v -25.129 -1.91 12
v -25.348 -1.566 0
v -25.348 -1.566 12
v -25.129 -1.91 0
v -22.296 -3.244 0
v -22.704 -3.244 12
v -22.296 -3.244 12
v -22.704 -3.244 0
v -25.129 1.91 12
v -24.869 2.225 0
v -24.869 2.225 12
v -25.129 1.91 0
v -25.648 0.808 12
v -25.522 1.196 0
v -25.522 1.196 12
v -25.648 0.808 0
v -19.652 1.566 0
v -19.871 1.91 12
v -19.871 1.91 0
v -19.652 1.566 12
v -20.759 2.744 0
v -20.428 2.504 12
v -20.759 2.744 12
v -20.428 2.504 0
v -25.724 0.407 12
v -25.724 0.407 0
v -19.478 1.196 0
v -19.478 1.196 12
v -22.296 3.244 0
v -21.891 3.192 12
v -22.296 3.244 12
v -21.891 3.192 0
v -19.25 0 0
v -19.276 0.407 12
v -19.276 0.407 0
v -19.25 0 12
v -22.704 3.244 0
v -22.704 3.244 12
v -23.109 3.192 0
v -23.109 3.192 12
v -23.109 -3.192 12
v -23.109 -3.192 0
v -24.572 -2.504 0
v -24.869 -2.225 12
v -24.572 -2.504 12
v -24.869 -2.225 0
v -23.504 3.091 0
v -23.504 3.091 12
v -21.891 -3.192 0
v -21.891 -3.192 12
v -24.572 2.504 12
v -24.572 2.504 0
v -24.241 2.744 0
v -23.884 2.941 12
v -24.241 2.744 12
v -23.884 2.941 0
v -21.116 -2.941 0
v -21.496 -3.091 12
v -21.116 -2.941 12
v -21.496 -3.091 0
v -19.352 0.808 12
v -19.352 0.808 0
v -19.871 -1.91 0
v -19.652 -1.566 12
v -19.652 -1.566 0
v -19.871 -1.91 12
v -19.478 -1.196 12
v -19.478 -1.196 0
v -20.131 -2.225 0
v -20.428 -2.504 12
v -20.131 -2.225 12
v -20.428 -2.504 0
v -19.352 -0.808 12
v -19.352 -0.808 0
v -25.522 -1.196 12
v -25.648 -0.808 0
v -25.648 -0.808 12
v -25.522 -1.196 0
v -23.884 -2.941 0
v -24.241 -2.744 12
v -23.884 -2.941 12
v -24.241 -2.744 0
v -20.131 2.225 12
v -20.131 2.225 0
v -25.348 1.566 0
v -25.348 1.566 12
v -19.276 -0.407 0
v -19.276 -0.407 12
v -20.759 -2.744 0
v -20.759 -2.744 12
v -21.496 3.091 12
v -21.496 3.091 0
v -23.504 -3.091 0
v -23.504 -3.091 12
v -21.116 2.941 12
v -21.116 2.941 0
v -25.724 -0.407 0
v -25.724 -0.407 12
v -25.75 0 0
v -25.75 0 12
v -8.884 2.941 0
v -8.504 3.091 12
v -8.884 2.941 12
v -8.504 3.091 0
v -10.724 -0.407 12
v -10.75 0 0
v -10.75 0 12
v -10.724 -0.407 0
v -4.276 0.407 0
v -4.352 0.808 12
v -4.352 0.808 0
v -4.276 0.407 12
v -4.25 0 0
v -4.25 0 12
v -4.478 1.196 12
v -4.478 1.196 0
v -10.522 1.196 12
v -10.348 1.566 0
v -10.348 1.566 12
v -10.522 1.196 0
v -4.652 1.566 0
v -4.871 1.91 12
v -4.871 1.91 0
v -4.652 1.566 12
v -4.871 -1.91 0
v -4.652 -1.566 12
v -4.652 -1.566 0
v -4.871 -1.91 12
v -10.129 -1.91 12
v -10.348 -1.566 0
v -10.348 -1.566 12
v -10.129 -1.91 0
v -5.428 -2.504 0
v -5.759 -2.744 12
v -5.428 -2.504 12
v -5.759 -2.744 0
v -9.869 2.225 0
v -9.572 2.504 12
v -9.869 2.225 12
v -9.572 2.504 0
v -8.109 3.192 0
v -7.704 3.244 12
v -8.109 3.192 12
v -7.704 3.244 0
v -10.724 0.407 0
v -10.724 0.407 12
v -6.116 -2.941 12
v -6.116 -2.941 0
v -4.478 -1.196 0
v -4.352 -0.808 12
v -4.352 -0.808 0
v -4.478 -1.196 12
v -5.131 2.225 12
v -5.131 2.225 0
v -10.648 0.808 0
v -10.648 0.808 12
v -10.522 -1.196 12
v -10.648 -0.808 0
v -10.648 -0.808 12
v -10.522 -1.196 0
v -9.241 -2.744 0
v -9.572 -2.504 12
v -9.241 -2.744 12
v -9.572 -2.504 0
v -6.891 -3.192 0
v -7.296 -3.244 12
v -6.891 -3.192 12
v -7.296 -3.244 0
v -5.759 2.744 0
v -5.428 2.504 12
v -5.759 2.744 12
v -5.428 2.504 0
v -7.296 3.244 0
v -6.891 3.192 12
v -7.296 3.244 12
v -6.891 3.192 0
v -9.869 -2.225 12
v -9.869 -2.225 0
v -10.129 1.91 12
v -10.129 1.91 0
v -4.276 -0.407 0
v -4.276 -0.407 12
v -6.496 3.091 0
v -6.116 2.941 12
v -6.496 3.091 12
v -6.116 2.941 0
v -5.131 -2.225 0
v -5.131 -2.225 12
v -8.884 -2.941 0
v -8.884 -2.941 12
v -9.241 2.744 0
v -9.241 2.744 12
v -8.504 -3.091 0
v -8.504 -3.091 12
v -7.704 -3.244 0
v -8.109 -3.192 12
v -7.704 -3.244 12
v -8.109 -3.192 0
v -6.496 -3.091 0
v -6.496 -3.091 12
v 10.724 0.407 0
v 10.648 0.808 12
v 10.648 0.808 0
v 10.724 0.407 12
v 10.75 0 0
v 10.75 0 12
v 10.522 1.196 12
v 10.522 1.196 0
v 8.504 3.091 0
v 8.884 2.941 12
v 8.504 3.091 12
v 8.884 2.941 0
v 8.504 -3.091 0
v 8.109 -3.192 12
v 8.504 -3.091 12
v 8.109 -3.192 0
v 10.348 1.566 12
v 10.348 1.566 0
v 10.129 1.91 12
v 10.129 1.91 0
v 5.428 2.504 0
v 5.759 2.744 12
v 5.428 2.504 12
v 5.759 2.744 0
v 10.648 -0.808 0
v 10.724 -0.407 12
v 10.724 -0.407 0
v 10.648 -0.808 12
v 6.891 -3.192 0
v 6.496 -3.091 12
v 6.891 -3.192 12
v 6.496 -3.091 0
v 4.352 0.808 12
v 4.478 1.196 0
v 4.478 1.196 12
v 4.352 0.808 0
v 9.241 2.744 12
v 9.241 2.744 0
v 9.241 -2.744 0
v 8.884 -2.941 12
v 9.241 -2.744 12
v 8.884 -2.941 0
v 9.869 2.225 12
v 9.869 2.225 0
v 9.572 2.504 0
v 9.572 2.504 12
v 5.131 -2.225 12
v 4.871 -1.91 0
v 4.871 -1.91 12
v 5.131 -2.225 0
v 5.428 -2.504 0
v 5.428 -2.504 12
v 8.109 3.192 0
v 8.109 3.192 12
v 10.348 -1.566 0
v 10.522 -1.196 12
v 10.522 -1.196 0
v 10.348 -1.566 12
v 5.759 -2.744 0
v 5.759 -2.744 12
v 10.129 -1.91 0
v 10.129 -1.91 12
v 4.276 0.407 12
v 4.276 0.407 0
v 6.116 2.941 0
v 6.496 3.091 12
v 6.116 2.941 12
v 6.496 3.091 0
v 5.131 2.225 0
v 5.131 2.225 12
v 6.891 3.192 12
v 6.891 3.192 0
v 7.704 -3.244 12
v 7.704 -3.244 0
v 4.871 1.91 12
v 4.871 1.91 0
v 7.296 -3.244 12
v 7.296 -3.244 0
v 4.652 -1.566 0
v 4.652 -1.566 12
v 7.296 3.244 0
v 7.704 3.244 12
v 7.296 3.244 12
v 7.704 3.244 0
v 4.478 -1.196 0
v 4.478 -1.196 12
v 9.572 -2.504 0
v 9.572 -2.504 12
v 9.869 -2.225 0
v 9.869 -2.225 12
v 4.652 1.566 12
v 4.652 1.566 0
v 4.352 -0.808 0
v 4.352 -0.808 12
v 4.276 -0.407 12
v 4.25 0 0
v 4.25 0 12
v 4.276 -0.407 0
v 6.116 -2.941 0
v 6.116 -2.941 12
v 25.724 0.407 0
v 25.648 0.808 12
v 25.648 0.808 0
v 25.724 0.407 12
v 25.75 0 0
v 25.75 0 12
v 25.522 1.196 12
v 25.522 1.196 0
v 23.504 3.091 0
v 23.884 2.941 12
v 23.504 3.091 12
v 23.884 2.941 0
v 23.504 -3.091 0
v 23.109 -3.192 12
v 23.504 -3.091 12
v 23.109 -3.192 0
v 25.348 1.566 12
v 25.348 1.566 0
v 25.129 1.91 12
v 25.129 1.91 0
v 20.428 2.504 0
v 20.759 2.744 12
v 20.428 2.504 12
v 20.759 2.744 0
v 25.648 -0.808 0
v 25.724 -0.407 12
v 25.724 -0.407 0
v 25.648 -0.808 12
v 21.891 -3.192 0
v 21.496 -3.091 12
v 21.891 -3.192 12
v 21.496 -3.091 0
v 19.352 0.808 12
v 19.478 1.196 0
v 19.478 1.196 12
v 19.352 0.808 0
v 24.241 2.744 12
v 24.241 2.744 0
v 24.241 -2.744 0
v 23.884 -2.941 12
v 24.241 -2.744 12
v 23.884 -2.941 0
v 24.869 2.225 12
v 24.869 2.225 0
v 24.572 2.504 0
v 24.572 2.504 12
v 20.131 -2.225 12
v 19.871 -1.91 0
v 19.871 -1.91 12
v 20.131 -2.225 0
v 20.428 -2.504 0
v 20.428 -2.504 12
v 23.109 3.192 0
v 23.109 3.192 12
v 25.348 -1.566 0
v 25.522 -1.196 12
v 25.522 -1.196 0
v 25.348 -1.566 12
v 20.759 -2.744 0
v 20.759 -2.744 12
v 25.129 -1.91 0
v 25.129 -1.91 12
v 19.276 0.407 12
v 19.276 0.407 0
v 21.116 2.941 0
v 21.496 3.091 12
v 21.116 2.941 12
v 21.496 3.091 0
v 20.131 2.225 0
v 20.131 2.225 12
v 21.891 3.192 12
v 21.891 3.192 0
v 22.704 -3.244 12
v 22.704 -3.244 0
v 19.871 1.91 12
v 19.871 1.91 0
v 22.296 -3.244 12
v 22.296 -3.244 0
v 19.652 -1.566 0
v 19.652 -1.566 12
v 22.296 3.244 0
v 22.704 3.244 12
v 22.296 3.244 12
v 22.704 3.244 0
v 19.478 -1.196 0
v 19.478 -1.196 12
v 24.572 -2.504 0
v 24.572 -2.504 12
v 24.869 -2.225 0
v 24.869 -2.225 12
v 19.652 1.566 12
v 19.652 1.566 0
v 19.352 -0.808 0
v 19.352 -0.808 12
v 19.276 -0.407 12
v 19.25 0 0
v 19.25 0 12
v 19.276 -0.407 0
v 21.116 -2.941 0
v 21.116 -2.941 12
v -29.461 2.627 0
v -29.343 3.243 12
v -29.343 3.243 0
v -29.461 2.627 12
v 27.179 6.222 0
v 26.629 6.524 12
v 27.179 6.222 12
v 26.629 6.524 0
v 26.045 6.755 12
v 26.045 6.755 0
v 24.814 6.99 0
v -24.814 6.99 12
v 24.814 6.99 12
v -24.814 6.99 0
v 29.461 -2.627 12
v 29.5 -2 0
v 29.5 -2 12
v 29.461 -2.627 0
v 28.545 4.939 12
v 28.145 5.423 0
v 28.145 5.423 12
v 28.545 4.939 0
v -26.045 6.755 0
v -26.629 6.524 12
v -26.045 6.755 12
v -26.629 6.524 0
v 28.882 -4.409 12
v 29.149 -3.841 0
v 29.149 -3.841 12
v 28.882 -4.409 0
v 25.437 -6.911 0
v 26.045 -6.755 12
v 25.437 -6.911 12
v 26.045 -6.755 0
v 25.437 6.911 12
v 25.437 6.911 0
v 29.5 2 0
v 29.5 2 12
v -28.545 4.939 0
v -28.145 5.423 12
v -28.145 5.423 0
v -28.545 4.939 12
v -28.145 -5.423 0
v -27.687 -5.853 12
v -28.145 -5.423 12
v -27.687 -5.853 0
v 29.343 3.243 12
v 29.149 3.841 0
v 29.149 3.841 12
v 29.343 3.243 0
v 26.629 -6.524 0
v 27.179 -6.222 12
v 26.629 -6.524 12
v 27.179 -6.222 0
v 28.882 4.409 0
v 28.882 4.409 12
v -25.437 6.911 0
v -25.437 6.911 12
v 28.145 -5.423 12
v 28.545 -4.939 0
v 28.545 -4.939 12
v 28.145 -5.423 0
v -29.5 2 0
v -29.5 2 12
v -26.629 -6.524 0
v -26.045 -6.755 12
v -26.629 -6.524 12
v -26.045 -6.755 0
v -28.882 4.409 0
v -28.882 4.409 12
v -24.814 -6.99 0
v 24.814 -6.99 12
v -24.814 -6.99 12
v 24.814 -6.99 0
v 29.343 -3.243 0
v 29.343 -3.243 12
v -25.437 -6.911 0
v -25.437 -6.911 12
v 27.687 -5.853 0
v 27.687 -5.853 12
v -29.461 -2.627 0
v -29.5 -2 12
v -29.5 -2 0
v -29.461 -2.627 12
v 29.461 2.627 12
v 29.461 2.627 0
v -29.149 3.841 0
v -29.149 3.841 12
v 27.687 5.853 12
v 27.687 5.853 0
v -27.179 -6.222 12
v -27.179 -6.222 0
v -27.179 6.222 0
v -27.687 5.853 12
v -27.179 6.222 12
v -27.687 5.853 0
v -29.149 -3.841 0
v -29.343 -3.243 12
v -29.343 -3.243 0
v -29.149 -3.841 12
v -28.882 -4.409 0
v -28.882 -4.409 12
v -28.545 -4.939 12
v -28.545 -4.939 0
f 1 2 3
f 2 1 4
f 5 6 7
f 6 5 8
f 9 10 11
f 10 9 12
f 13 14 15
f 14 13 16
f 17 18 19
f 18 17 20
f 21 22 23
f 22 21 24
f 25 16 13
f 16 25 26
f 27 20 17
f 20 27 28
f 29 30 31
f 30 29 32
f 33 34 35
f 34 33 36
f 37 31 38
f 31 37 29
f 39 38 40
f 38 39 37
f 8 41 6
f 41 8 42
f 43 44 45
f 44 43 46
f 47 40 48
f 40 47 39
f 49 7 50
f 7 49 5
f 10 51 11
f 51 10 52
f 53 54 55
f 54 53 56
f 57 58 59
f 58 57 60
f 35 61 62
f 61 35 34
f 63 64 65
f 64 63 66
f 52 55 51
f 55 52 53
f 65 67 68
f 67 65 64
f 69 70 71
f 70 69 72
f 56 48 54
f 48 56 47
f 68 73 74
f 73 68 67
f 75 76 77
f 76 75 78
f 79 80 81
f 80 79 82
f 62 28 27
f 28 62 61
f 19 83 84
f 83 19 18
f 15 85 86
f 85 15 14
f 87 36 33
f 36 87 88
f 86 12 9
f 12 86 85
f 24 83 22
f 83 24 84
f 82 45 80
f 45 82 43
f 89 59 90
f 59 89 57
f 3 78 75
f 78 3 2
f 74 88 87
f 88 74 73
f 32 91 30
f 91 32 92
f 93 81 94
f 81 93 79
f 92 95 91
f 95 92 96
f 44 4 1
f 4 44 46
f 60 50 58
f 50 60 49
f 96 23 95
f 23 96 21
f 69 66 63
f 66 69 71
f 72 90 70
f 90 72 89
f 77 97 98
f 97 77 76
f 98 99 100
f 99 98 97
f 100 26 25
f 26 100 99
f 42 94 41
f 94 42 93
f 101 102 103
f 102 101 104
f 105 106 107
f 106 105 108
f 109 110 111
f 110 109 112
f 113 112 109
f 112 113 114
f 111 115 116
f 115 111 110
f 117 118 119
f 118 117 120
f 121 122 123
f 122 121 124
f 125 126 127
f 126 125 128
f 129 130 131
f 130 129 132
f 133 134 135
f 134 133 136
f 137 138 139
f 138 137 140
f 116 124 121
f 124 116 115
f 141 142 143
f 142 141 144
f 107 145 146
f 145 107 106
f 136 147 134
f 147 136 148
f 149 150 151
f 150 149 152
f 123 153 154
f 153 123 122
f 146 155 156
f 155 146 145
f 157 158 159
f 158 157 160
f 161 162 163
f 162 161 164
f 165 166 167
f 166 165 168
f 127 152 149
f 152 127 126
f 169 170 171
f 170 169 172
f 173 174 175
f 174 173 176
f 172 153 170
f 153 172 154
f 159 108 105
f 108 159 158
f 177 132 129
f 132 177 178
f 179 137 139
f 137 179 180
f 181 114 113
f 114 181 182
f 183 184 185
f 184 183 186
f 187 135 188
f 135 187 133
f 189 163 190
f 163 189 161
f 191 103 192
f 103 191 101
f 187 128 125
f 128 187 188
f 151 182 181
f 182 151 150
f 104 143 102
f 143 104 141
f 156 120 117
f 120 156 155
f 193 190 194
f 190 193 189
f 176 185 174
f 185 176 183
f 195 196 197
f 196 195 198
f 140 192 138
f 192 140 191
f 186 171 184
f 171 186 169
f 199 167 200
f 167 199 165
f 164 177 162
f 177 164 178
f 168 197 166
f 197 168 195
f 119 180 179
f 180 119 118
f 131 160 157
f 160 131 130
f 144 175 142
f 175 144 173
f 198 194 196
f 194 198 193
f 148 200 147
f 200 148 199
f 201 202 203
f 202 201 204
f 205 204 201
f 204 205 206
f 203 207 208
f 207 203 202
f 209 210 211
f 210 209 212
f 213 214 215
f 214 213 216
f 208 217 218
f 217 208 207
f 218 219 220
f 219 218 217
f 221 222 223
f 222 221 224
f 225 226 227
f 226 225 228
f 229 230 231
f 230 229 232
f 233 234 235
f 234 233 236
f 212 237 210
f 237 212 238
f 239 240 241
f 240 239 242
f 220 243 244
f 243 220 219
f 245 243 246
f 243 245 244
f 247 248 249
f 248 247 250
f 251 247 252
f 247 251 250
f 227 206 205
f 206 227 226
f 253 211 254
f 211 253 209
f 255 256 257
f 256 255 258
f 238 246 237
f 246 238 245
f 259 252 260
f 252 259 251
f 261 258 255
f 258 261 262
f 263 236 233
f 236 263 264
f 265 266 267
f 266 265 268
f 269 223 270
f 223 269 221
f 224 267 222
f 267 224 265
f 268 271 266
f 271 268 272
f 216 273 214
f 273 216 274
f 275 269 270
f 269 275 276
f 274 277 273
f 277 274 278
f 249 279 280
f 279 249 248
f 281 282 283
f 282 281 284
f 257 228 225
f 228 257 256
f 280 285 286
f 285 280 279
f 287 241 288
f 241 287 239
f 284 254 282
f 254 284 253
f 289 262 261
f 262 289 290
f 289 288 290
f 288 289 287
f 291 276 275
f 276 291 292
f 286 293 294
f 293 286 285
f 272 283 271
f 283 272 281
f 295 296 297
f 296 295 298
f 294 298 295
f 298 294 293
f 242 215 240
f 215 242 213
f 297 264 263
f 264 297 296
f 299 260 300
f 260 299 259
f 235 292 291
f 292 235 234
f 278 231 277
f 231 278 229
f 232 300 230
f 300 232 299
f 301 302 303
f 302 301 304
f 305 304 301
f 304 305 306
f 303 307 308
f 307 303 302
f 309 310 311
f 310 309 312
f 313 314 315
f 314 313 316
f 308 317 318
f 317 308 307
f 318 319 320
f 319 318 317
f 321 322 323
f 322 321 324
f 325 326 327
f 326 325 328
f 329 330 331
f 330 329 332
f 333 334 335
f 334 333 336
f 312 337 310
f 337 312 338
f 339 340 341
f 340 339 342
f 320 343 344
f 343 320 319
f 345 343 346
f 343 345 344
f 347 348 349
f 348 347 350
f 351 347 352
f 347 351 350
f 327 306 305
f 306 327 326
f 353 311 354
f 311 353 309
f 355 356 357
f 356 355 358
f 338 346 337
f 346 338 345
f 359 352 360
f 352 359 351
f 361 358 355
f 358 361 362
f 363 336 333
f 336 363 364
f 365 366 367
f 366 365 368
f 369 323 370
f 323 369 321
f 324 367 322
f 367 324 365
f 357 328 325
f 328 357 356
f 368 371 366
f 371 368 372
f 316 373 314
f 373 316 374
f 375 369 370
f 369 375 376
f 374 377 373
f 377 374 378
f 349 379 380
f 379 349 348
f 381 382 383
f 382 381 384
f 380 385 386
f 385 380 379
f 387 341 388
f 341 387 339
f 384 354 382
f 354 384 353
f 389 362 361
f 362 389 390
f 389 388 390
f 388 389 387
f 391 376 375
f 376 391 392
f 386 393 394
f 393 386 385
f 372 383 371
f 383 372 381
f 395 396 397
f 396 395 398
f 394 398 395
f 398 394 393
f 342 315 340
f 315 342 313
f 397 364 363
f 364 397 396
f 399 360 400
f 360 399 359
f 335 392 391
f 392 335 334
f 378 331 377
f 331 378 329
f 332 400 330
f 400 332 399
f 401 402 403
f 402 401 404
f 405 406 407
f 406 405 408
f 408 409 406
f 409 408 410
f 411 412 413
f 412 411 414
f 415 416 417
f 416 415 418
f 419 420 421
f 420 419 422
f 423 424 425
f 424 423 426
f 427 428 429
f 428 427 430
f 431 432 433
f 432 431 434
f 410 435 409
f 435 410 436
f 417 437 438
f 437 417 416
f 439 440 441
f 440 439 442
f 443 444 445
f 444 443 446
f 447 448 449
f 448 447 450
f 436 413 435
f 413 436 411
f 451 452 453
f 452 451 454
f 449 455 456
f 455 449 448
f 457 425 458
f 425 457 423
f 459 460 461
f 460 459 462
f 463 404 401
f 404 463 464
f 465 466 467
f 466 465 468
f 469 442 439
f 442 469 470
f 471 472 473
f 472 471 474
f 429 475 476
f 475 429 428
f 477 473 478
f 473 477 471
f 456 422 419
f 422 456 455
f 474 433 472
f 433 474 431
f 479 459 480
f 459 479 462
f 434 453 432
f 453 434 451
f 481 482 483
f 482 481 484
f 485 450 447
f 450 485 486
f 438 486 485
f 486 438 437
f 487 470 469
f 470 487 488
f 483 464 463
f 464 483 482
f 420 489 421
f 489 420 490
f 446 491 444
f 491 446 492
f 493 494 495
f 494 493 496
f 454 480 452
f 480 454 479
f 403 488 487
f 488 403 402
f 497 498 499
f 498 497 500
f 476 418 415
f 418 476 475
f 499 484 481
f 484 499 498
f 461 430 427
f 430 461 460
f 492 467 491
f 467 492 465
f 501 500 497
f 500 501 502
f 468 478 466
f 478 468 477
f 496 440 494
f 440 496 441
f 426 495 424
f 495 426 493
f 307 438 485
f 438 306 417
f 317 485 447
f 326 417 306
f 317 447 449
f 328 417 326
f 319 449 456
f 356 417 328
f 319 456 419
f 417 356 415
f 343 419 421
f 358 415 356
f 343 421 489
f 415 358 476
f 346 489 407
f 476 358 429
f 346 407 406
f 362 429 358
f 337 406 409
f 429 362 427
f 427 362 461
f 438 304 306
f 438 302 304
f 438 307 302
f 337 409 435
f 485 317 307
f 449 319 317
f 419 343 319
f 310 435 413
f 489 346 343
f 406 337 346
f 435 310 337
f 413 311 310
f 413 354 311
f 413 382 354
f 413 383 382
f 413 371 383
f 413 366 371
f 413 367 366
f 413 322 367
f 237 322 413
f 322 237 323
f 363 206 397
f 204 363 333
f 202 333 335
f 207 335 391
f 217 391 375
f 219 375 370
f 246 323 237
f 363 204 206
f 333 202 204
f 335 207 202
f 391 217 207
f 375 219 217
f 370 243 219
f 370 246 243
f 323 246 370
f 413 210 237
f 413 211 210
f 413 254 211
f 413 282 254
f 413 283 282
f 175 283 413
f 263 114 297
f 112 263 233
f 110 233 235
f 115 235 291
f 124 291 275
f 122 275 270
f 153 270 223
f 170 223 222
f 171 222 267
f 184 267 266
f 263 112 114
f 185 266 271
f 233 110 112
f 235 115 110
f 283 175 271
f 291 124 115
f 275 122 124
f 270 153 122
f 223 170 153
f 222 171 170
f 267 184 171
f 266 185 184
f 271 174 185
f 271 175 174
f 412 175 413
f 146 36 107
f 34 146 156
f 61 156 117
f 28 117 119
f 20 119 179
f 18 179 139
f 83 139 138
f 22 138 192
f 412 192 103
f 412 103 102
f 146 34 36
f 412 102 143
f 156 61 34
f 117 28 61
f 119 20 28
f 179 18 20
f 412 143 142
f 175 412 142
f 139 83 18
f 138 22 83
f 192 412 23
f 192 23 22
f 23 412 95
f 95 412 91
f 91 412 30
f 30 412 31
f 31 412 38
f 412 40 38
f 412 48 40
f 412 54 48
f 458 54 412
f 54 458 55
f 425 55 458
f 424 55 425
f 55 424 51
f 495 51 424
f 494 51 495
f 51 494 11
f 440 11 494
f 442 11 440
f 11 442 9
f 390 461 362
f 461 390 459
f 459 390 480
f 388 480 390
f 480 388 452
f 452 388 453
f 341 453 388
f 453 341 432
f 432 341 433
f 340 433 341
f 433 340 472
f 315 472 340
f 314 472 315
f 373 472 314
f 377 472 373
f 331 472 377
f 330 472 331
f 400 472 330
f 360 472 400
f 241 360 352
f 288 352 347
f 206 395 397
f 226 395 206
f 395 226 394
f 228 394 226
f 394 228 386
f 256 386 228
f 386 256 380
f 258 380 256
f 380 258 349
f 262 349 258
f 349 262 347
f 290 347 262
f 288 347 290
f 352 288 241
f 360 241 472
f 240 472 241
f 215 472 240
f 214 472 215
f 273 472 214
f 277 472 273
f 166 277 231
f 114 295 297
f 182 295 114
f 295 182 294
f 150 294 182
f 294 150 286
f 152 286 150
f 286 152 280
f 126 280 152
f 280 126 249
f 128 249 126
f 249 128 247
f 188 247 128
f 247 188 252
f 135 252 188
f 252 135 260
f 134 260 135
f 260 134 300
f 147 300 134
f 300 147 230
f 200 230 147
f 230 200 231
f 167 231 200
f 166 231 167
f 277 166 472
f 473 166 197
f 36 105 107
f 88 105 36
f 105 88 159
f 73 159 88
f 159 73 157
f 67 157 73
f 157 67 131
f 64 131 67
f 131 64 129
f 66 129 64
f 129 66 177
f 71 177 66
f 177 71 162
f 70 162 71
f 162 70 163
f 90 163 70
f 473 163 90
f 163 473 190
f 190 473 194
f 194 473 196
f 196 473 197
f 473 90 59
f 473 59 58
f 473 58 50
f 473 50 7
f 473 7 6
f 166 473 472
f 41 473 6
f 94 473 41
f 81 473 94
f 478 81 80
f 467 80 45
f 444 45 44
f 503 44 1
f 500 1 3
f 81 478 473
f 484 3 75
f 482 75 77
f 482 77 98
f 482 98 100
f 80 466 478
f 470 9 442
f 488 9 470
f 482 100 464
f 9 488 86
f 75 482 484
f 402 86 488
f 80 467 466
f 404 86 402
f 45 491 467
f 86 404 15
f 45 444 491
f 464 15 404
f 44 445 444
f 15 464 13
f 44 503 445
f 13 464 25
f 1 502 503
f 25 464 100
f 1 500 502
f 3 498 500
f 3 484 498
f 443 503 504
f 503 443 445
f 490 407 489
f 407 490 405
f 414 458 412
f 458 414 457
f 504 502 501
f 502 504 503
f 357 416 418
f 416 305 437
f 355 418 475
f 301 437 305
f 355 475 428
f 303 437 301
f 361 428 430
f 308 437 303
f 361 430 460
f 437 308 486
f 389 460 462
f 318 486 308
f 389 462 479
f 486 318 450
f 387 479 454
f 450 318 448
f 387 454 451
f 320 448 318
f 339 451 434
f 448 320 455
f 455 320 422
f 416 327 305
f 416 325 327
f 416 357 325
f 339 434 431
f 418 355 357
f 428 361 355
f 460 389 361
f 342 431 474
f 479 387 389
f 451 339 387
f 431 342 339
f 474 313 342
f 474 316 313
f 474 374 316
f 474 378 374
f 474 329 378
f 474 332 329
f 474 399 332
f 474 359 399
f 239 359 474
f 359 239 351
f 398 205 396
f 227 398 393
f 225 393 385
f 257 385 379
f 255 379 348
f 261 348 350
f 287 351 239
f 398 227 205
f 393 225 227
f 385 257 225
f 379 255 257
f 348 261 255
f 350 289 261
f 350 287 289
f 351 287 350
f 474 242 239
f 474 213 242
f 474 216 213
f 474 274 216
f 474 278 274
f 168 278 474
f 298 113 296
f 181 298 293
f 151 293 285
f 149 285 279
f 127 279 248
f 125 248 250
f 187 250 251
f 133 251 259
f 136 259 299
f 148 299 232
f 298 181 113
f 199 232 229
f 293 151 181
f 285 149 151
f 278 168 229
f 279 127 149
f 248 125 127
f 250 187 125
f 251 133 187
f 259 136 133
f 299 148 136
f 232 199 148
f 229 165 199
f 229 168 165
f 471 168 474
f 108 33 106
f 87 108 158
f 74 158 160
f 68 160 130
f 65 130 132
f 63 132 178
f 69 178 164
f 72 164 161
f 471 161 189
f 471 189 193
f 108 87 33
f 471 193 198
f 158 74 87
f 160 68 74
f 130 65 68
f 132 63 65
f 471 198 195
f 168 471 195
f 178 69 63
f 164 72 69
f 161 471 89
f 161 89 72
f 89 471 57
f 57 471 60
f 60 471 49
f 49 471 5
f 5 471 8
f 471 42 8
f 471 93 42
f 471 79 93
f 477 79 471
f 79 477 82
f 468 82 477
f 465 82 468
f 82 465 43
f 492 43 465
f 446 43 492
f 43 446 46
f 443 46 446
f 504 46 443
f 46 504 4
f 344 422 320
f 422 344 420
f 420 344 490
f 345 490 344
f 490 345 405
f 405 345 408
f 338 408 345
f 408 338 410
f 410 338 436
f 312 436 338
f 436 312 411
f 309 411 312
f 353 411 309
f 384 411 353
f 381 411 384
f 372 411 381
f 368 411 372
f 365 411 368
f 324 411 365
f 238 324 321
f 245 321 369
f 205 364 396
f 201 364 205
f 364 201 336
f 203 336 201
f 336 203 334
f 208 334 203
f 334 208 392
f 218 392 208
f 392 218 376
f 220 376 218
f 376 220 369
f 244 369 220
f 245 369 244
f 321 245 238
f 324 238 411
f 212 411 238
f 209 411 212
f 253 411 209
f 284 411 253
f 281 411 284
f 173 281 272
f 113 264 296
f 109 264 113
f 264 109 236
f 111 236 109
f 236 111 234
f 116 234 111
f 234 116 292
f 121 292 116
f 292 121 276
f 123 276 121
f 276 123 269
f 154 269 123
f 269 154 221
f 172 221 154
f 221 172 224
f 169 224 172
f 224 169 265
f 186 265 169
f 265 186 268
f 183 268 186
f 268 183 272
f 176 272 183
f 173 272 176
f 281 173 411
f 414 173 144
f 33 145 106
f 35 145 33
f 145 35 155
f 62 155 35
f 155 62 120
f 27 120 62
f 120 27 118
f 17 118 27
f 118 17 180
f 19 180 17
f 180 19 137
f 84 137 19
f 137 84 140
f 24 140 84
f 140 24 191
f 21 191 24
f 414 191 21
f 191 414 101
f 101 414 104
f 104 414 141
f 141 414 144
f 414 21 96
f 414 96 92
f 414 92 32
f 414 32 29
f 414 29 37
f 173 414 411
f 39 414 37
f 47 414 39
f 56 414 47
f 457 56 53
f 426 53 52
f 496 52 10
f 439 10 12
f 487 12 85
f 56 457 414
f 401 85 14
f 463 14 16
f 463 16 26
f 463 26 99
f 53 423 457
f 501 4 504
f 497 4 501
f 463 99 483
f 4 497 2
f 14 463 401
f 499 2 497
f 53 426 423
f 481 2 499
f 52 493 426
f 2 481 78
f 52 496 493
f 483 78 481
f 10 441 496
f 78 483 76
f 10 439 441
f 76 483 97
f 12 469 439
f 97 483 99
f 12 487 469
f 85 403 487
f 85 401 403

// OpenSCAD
$fn = 50;


difference() {
	union() {
		hull() {
			translate(v = [-24.5000000000, 2.0000000000, 0]) {
				cylinder(h = 12, r = 5);
			}
			translate(v = [24.5000000000, 2.0000000000, 0]) {
				cylinder(h = 12, r = 5);
			}
			translate(v = [-24.5000000000, -2.0000000000, 0]) {
				cylinder(h = 12, r = 5);
			}
			translate(v = [24.5000000000, -2.0000000000, 0]) {
				cylinder(h = 12, r = 5);
			}
		}
	}
	union() {
		translate(v = [-22.5000000000, 0.0000000000, -100.0000000000]) {
			cylinder(h = 200, r = 3.2500000000);
		}
		translate(v = [-7.5000000000, 0.0000000000, -100.0000000000]) {
			cylinder(h = 200, r = 3.2500000000);
		}
		translate(v = [7.5000000000, 0.0000000000, -100.0000000000]) {
			cylinder(h = 200, r = 3.2500000000);
		}
		translate(v = [22.5000000000, 0.0000000000, -100.0000000000]) {
			cylinder(h = 200, r = 3.2500000000);
		}
	}
}
